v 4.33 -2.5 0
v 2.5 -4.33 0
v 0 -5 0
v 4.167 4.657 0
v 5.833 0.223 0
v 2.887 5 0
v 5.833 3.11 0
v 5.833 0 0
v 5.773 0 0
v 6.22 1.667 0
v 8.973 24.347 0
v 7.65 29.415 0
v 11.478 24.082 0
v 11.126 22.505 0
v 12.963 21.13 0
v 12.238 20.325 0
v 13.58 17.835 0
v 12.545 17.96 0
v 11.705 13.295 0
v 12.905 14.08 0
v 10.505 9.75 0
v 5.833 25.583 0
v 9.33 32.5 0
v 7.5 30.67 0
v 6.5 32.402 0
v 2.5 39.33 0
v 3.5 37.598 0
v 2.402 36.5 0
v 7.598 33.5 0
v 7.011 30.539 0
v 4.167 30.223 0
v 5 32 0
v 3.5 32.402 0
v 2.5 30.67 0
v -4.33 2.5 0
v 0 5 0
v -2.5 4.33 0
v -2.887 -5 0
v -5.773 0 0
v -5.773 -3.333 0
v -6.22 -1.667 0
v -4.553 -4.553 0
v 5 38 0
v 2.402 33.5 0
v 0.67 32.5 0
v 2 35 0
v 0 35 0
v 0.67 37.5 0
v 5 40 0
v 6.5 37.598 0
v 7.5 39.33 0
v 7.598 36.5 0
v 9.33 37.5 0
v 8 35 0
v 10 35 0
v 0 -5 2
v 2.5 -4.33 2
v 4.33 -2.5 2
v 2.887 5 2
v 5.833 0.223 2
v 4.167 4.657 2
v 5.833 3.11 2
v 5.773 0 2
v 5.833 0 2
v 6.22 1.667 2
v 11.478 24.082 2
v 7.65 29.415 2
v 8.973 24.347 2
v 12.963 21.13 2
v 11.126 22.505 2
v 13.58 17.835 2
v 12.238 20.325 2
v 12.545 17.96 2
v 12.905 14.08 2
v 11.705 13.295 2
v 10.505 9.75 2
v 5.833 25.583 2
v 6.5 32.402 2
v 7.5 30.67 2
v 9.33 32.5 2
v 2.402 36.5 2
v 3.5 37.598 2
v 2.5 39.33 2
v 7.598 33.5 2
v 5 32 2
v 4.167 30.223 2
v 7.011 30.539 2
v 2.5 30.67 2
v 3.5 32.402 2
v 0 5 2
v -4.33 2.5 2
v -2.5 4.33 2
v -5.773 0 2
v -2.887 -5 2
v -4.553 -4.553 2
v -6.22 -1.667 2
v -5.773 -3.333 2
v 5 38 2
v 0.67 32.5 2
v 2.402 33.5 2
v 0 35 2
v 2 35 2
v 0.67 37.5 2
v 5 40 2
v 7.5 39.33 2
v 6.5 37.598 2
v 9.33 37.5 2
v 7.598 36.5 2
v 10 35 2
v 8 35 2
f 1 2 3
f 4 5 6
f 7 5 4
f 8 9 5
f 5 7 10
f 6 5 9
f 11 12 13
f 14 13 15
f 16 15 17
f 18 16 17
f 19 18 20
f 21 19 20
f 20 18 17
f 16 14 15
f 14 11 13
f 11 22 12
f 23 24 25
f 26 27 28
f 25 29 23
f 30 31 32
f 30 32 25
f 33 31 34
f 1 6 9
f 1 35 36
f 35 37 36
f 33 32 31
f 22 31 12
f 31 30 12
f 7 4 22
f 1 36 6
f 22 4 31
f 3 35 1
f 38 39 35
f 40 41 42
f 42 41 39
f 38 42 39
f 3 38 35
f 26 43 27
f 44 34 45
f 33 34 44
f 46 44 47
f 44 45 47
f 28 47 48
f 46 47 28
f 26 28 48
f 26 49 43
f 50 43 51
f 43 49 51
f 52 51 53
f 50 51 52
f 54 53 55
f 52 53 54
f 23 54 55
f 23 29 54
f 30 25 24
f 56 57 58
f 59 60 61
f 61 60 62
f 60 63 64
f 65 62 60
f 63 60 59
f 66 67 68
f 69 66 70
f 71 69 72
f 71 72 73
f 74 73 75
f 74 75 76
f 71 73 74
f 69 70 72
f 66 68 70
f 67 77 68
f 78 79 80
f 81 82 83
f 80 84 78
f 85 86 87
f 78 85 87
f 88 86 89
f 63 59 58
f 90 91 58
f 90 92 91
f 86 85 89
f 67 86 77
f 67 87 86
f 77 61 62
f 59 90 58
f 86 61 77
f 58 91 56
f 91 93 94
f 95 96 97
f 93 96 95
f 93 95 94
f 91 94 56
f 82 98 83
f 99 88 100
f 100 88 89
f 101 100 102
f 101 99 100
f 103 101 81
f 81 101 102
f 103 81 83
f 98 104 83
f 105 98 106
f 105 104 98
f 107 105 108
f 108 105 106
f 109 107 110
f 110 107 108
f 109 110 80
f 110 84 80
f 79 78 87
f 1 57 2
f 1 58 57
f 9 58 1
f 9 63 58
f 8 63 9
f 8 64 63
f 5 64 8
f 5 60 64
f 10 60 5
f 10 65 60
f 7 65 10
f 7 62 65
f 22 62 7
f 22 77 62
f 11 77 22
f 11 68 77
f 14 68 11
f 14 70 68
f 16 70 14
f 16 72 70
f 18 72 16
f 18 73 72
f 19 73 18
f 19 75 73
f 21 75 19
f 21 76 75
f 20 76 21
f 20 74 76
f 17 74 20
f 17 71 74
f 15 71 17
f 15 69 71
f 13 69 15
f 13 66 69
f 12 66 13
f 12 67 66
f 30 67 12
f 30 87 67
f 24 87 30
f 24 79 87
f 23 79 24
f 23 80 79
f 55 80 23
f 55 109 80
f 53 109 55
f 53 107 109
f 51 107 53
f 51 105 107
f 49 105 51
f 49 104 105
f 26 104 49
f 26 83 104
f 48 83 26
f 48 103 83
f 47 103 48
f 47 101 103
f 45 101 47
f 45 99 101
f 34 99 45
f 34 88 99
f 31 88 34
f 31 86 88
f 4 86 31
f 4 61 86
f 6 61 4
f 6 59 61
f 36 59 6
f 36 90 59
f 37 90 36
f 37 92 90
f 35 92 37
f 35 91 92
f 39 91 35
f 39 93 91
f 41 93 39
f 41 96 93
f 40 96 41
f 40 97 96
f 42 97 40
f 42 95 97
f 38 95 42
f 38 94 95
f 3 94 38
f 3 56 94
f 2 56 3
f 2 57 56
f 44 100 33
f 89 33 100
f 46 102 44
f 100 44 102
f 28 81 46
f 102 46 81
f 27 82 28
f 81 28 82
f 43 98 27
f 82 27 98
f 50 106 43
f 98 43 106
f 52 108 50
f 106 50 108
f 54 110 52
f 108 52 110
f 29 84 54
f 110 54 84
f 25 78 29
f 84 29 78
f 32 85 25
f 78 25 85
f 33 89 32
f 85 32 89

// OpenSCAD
theitem = "1/8"; // [alt,bass,violin,#,b,natural,1/1,1/2,1/4,1/8,1/16,1/32,1/1 break,1/2 break,1/4 break,1/8 break,1/16 break,1/32 break]

//height of the note-body. a normal note has a height of "3.5 * note_body_height"
note_body_height =10;
zeilenhoehe = note_body_height;

ring_x = 5;
ring_y = 35;
ring_inner_radius = 3;
ring_wallthickness = 2;

z_height = 2; 

$fn=11+1;



 
linear_extrude(height=z_height)
difference(){
	union(){
		item(theitem);
		translate([ring_x,ring_y,0])
			circle(r=ring_inner_radius+ring_wallthickness);
	}
	translate([ring_x,ring_y,0])
		circle(r=ring_inner_radius);
	
}



module item(item){

if(item == "violin"){
	violinschluessel(zeilenhoehe);
}else if(item == "bass"){
	bassschluessel(zeilenhoehe);
}else if(item == "alt"){
	altschluessel(zeilenhoehe);
}else if(item == "#"){
	translate([0,-zeilenhoehe + 5*(zeilenhoehe/2),0])
			vorzeichen("#", zeilenhoehe);
}else if(item == "b"){
	translate([0,-zeilenhoehe + 5*(zeilenhoehe/2),0])
			vorzeichen("b", zeilenhoehe);
}else if(item == "natural"){
	translate([0,-zeilenhoehe + 5*(zeilenhoehe/2),0])
			vorzeichen("n", zeilenhoehe);
}else if(item == "1/1"){	
	note(zeilenhoehe,"1/1",5);
}else if(item == "1/2"){	
	note(zeilenhoehe,"1/2",5);
}else if(item == "1/4"){	
	note(zeilenhoehe,"1/4",5);
}else if(item == "1/8"){	
	note(zeilenhoehe,"1/8",5);
}else if(item == "1/16"){	
	note(zeilenhoehe,"1/6",5);
}else if(item == "1/32"){	
	note(zeilenhoehe,"1/3",5);
}else if(item == "1/32"){	
	note(zeilenhoehe,"1/3",5);
}else if(item == "1/1 break"){	
	break(zeilenhoehe,"1/1");
}else if(item == "1/2 break"){	
	break(zeilenhoehe,"1/2");
}else if(item == "1/4 break"){	
	break(zeilenhoehe,"1/4");
}else if(item == "1/8 break"){	
	break(zeilenhoehe,"1/8");
}else if(item == "1/16 break"){	
	break(zeilenhoehe,"1/6");
}else if(item == "1/32 break"){	
	break(zeilenhoehe,"1/3");
}

}


/////////////////////////////////////





module note(zh,nw,tonhoehe){

	notenradius = zh/2;
	zweidrittel=notenradius*2/3;

	if(nw != "1/1"){

	difference(){
	union(){
			translate([zh/2-zweidrittel/4,0,0])
				square(size = [zweidrittel/2,zh*3.5]);
		rotate([0,0,30])
			hull(){
				circle(r = zh/2);
				translate([zweidrittel,0,0])
					circle(r = zweidrittel);
				translate([-zweidrittel,0,0])
					circle(r = zweidrittel);
			}
	}
		if(nw == "1/2"){
			rotate([0,0,30])
				hull(){
					translate([zh/4,0,0])
						circle(r = zh/4);

					translate([-zh/4,0,0])
						circle(r = zh/4);
				}
		}
	}

	
	if(nw == "1/8"){
		translate([tonhoehe >= 6 ? zh/2.5 : zh/2 + (zweidrittel/4.1),zh*2.85,0])
			if(tonhoehe >= 6)
				mirror(0,1,0)
					fahne(zh);
			else
				fahne(zh);
	}
	if(nw == "1/6"){
		for(i=[0:1])
		translate([tonhoehe >= 6 ? zh/2.5 : zh/2 + (zweidrittel/4.1),zh*2.85 - (i*zh),0])
			if(tonhoehe >= 6)
				mirror(0,1,0)
					fahne(zh);
			else
				fahne(zh);
	}
	if(nw == "1/3"){
		for(i=[-1:1])
		translate([tonhoehe >= 6 ? zh/2.5 : zh/2 + (zweidrittel/4.1),zh*2.85 - (i*zh),0])
			if(tonhoehe >= 6)
				mirror(0,1,0)
					fahne(zh);
			else
				fahne(zh);
		translate([zh/2-zweidrittel/4,zh,0])
				square(size = [zweidrittel/2,zh*3.5]);
	}


	}else{
difference(){
	union(){
			hull(){
				circle(r = zh/2);
				translate([zweidrittel,0,0])
					circle(r = zweidrittel);
				translate([-zweidrittel,0,0])
					circle(r = zweidrittel);
			}
	}

			rotate([0,0,-30])
				hull(){
					translate([zh/8,0,0])
						circle(r = zh/4);

					translate([-zh/8,0,0])
						circle(r = zh/4);
				}
}

	}
}



module fahne(zh){
scale(v = [zh/4, zh/4, zh/4])
translate([1.5,-2.5,0])
  polygon(points=
    [[-1.608, 1.379], [-0.236, 0.839], [0.625, 0.102], [1.070, -0.770], [1.193, -1.716], [0.857, -3.582], [0.377, -5.000], [1.337, -3.268], [1.607, -1.766], [1.360, -0.448], [0.766, 0.733], [-0.765, 2.866], [-1.359, 3.910], [-1.608, 5.000]]
    , paths=
    [[0, 1, 2, 3, 4, 5, 6, 7, 8, 9, 10, 11, 12, 13, 0]]
    );

}


module vorzeichen(vz, zh){
	if(vz == "#")
		vorzeichen_sharp(zh);
	if(vz == "b")
		vorzeichen_b(zh);
	if(vz == "n")
		vorzeichen_natural(zh);
}


module vorzeichen_sharp(zh) {
scale(v = [zh/5, zh/5, zh/5])
  polygon(points=
    [[0.676, 6.500], [0.676, 3.768], [-0.620, 3.194], [-0.620, 5.880], [-1.259, 5.880], [-1.259, 2.907], [-1.935, 2.611], [-1.935, 0.444], [-1.259, 0.741], [-1.259, -1.852], [-1.935, -2.148], [-1.935, -4.315], [-1.259, -4.018], [-1.259, -6.500], [-0.620, -6.500], [-0.620, -3.731], [0.676, -3.167], [0.676, -5.843], [1.315, -5.843], [1.315, -2.880], [1.935, -2.611], [1.935, -0.435], [1.315, -0.713], [1.315, 1.880], [1.935, 2.157], [1.935, 4.324], [1.315, 4.046], [1.315, 6.500], [0.676, 1.602], [0.676, -0.991], [-0.620, -1.565], [-0.620, 1.028]]
    , paths=
    [[0, 1, 2, 3, 4, 5, 6, 7, 8, 9, 10, 11, 12, 13, 14, 15, 16, 17, 18, 19, 20, 21, 22, 23, 24, 25, 26, 27, 0, 0], [28, 29, 30, 31, 28, 28]]
    );
}

module vorzeichen_b(zh) {
scale(v = [zh/5, zh/5, zh/5])
translate([0,3,0])
  polygon(points=
    [[-3.276, 7.500], [-3.276, -7.500], [-3.093, -7.500], [-0.500, -6.648], [1.446, -5.288], [2.710, -3.675], [3.256, -2.064], [3.049, -0.712], [2.054, 0.127], [0.236, 0.197], [-2.440, -0.758], [-2.440, 7.500], [-3.276, 7.500], [-0.009, -0.627], [0.711, -0.811], [1.005, -1.301], [0.585, -2.862], [-0.741, -4.638], [-2.440, -5.958], [-2.440, -1.280]]
    , paths=
    [[0, 1, 2, 3, 4, 5, 6, 7, 8, 9, 10, 11, 12, 0], [13, 14, 15, 16, 17, 18, 19, 13, 13]]
    );
}

module vorzeichen_natural(zh) {
scale(v = [zh/5, zh/5, zh/5])
  polygon(points=
    [[-1.915, 6.500], [-1.915, -3.955], [1.295, -1.911], [1.295, -6.500], [1.915, -6.500], [1.915, 3.955], [-1.268, 1.929], [-1.268, 6.500], [1.295, 1.837], [1.295, -0.190], [-1.268, -1.818], [-1.268, 0.208]]
    , paths=
    [[0, 1, 2, 3, 4, 5, 6, 7, 0], [8, 9, 10, 11, 8]]
    );
}


module break(zh,nw){
	if(nw == "1/1")
		pause_1_1(zh);
	if(nw == "1/2")
		pause_1_2(zh);
	if(nw == "1/4")
		pause_1_4(zh);
	if(nw == "1/8")
		pause_1_8(zh);
	if(nw == "1/6")
		pause_1_16(zh);
	if(nw == "1/3")
		pause_1_32(zh);
}


module pause_1_1(zh) {
translate([0,2.5*zh,0])
	square(size = [zh*2,zh*0.5]);
}

module pause_1_2(zh) {
translate([0,2*zh,0])
	square(size = [zh*2,zh*0.5]);
}

module pause_1_4(zh) {
translate([0,2*zh,0])
scale(v = [zh/5.5, zh/5.5, zh/5.5])
  polygon(points=
    [[-0.983, 7.462], [-1.147, 7.044], [-0.707, 6.498], [-0.039, 5.578], [0.121, 4.196], [-0.584, 2.939], [-1.172, 2.439], [-2.362, 1.138], [-2.407, 0.846], [-1.545, -0.471], [0.527, -2.922], [0.589, -2.983], [0.507, -2.942], [-1.205, -2.433], [-2.382, -2.442], [-2.677, -2.733], [-2.550, -4.386], [-1.402, -6.689], [-0.815, -7.465], [-0.605, -7.465], [-0.666, -7.174], [-1.124, -5.887], [-1.065, -4.554], [-0.605, -3.968], [0.668, -3.969], [1.907, -4.595], [2.075, -4.744], [2.494, -4.575], [2.346, -4.095], [0.778, -2.231], [0.191, -0.849], [0.372, 0.150], [0.946, 0.994], [1.530, 1.494], [2.744, 2.837], [2.600, 3.588], [0.946, 5.578], [-0.707, 7.483], [-0.983, 7.462]]
    , paths=
    [[0, 1, 2, 3, 4, 5, 6, 7, 8, 9, 10, 11, 12, 13, 14, 15, 16, 17, 18, 19, 20, 21, 22, 23, 24, 25, 26, 27, 28, 29, 30, 31, 32, 33, 34, 35, 36, 37, 38, 0]]
    );
}

module pause_1_8(zh) {
translate([0,2*zh,0])
scale(v = [zh/5.5, zh/5.5, zh/5.5])
  polygon(points=
    [[-1.481, 4.970], [-2.212, 4.617], [-2.667, 3.941], [-2.709, 3.489], [-2.537, 2.735], [-2.058, 2.169], [-1.355, 1.832], [-0.302, 1.807], [1.121, 2.152], [1.378, 2.241], [0.108, -1.269], [-1.140, -4.775], [-1.030, -4.843], [-0.536, -4.991], [0.088, -4.712], [1.421, -0.193], [2.711, 4.262], [2.669, 4.324], [2.218, 4.392], [2.066, 4.198], [1.121, 3.080], [0.539, 2.949], [0.150, 3.747], [-0.452, 4.802], [-1.481, 4.970]]
    , paths=
    [[0, 1, 2, 3, 4, 5, 6, 7, 8, 9, 10, 11, 12, 13, 14, 15, 16, 17, 18, 19, 20, 21, 22, 23, 24, 0]]
    );
}

module pause_1_16(zh) {
translate([0,1.5*zh,0])
scale(v = [zh/5.5, zh/5.5, zh/5.5])
  polygon(points=
    [[-0.573, 7.468], [-1.285, 7.123], [-1.724, 6.464], [-1.769, 6.024], [-1.601, 5.288], [-1.134, 4.737], [-0.445, 4.408], [0.557, 4.374], [1.924, 4.700], [2.194, 4.786], [1.212, 1.595], [0.434, 0.506], [-0.235, 0.254], [-0.614, 1.032], [-0.971, 1.846], [-1.808, 2.254], [-2.753, 2.014], [-3.361, 1.216], [-3.406, 0.777], [-3.238, 0.044], [-2.771, -0.507], [-2.082, -0.836], [-0.865, -0.836], [0.266, -0.543], [0.583, -0.461], [-1.515, -7.255], [-1.182, -7.444], [-0.676, -7.444], [-0.343, -7.235], [1.545, -0.206], [3.413, 6.777], [3.371, 6.838], [2.972, 6.924], [2.639, 6.505], [1.965, 5.646], [1.401, 5.498], [1.023, 6.275], [0.434, 7.303], [-0.573, 7.468]]
    , paths=
    [[0, 1, 2, 3, 4, 5, 6, 7, 8, 9, 10, 11, 12, 13, 14, 15, 16, 17, 18, 19, 20, 21, 22, 23, 24, 25, 26, 27, 28, 29, 30, 31, 32, 33, 34, 35, 36, 37, 38, 0]]
    );
}

module pause_1_32(zh) {
translate([0,2*zh,0])
scale(v = [zh/5.5, zh/5.5, zh/5.5])
  polygon(points=
    [[0.122, 9.959], [-0.580, 9.615], [-1.016, 8.963], [-1.061, 8.528], [-1.016, 8.093], [-0.689, 7.491], [-0.126, 7.078], [0.764, 6.891], [2.488, 7.200], [2.817, 7.306], [2.402, 5.708], [1.926, 3.969], [1.179, 2.973], [0.642, 2.826], [0.269, 3.594], [-0.085, 4.404], [-0.912, 4.803], [-1.846, 4.566], [-2.447, 3.782], [-2.492, 3.347], [-2.324, 2.619], [-1.863, 2.074], [-1.183, 1.749], [0.020, 1.749], [1.138, 2.038], [1.471, 2.144], [0.597, -1.092], [-0.147, -2.129], [-0.789, -2.357], [-1.162, -1.588], [-1.516, -0.783], [-2.343, -0.380], [-3.276, -0.617], [-3.878, -1.405], [-3.923, -1.839], [-3.878, -2.274], [-3.550, -2.876], [-2.987, -3.291], [-2.077, -3.478], [-1.370, -3.433], [-0.166, -3.124], [0.102, -3.018], [0.102, -3.084], [-1.682, -9.758], [-1.102, -10.005], [-0.520, -9.758], [1.740, -0.222], [3.919, 9.317], [3.625, 9.439], [3.272, 9.110], [2.467, 8.029], [2.073, 8.008], [1.699, 8.777], [1.118, 9.793], [0.122, 9.959]]
    , paths=
    [[0, 1, 2, 3, 4, 5, 6, 7, 8, 9, 10, 11, 12, 13, 14, 15, 16, 17, 18, 19, 20, 21, 22, 23, 24, 25, 26, 27, 28, 29, 30, 31, 32, 33, 34, 35, 36, 37, 38, 39, 40, 41, 42, 43, 44, 45, 46, 47, 48, 49, 50, 51, 52, 53, 54, 0]]
    );
}


module altschluessel(zh) {
scale(v = [zh/6.2, zh/6.2, zh/6.2])
translate([0,12.5,0])
  polygon(points=
    [[-8.123, -12.484], [-8.123, 11.892], [-8.123, 12.431], [-5.302, 12.431], [-5.302, -11.945], [-5.302, -12.484], [-3.880, -12.484], [-3.880, 11.892], [-3.880, 12.431], [-2.979, 12.431], [-2.979, 0.222], [-1.632, 1.681], [-0.497, 4.038], [-0.019, 5.888], [0.638, 3.753], [1.657, 2.611], [2.792, 2.273], [3.946, 2.591], [4.584, 3.552], [4.966, 6.692], [4.924, 8.203], [4.711, 9.556], [4.171, 10.782], [3.142, 11.522], [2.007, 11.681], [1.158, 11.501], [0.776, 10.994], [1.179, 10.317], [1.635, 9.736], [1.763, 9.186], [1.317, 8.097], [0.129, 7.643], [-1.059, 8.171], [-1.536, 9.429], [-1.331, 10.332], [-0.847, 11.100], [0.723, 12.135], [2.611, 12.484], [4.680, 12.104], [6.451, 10.983], [7.681, 9.165], [8.127, 6.744], [7.953, 5.033], [7.438, 3.647], [6.642, 2.572], [5.656, 1.829], [3.333, 1.216], [1.211, 1.787], [0.087, -0.031], [1.211, -1.839], [3.492, -1.363], [4.815, -1.567], [5.963, -2.167], [6.893, -3.089], [7.575, -4.249], [8.127, -6.892], [7.960, -8.333], [7.459, -9.672], [6.655, -10.824], [5.581, -11.723], [4.274, -12.293], [2.792, -12.484], [1.113, -12.229], [-0.263, -11.617], [-1.179, -10.644], [-1.483, -9.291], [-0.942, -8.129], [0.087, -7.653], [1.285, -8.129], [1.816, -9.291], [1.688, -9.799], [1.317, -10.338], [0.967, -10.782], [0.829, -11.152], [1.190, -11.628], [2.102, -11.860], [3.559, -11.450], [4.436, -10.391], [4.865, -8.816], [5.008, -6.892], [4.595, -3.699], [3.940, -2.668], [2.792, -2.325], [1.694, -2.590], [0.882, -3.393], [0.023, -5.898], [-0.635, -3.551], [-1.706, -1.554], [-2.979, -0.222], [-2.979, -12.484], [-3.880, -12.484]]
    , paths=
    [[0, 1, 2, 3, 4, 5, 0, 0], [6, 7, 8, 9, 10, 11, 12, 13, 14, 15, 16, 17, 18, 19, 20, 21, 22, 23, 24, 25, 26, 27, 28, 29, 30, 31, 32, 33, 34, 35, 36, 37, 38, 39, 40, 41, 42, 43, 44, 45, 46, 47, 48, 49, 50, 51, 52, 53, 54, 55, 56, 57, 58, 59, 60, 61, 62, 63, 64, 65, 66, 67, 68, 69, 70, 71, 72, 73, 74, 75, 76, 77, 78, 79, 80, 81, 82, 83, 84, 85, 86, 87, 88, 89, 90, 6]]
    );}





module bassschluessel(zh) {
translate([0,zh*1.3,0])
scale(v = [zh/6.2, zh/6.2, zh/6.2])
translate([0,7.5,0])
  polygon(points=
    [[-6.497, -7.077], [-3.725, -5.161], [-1.850, -3.543], [-0.220, -1.360], [0.670, 0.713], [1.064, 2.959], [0.796, 4.860], [-0.102, 6.360], [-0.835, 6.802], [-1.763, 6.949], [-3.630, 6.556], [-4.367, 6.036], [-4.843, 5.268], [-4.922, 5.040], [-4.725, 4.750], [-4.410, 4.648], [-4.024, 4.718], [-3.496, 4.797], [-2.370, 4.357], [-1.874, 3.297], [-2.126, 2.457], [-2.811, 1.836], [-3.772, 1.609], [-4.646, 1.751], [-5.379, 2.182], [-5.868, 2.850], [-6.032, 3.690], [-5.850, 4.798], [-5.308, 5.747], [-3.449, 7.051], [-1.173, 7.491], [0.060, 7.331], [1.222, 6.847], [2.234, 6.090], [3.010, 5.103], [3.510, 3.959], [3.679, 2.732], [3.301, 0.551], [2.167, -1.470], [0.476, -3.285], [-1.574, -4.847], [-6.387, -7.486], [4.443, 5.072], [4.750, 5.779], [5.483, 6.069], [6.184, 5.747], [6.499, 5.033], [6.184, 4.310], [5.443, 4.027], [4.727, 4.334], [4.443, 0.957], [4.735, 1.671], [5.483, 1.962], [6.184, 1.648], [6.499, 0.957], [6.200, 0.211], [5.483, -0.088], [4.735, 0.203]]
    , paths=
    [[0, 1, 2, 3, 4, 5, 6, 7, 8, 9, 10, 11, 12, 13, 14, 15, 16, 17, 18, 19, 20, 21, 22, 23, 24, 25, 26, 27, 28, 29, 30, 31, 32, 33, 34, 35, 36, 37, 38, 39, 40, 41, 0, 0], [42, 43, 44, 45, 46, 47, 48, 49, 42, 42], [50, 51, 52, 53, 54, 55, 56, 57, 50, 50]]
    );}



module violinschluessel(zh) {
scale(v = [zh/5.2, zh/5.2, zh/5.2])
translate([0,9.5,0])
  polygon(points=
    [[0.832, -1.806], [-0.578, -2.778], [-1.061, -3.577], [-1.220, -4.447], [-0.848, -5.711], [0.249, -6.726], [0.485, -6.967], [0.283, -7.088], [-0.767, -6.625], [-1.608, -5.840], [-2.165, -4.819], [-2.368, -3.656], [-2.153, -2.373], [-1.583, -1.187], [-0.715, -0.206], [0.367, 0.439], [-0.215, 3.492], [-1.983, 1.806], [-3.390, 0.043], [-4.321, -1.828], [-4.664, -3.854], [-4.284, -5.677], [-3.221, -7.294], [-1.577, -8.405], [0.485, -8.825], [2.140, -8.541], [1.439, -1.720], [2.756, -8.335], [3.610, -7.818], [4.219, -7.066], [4.706, -4.869], [4.175, -3.269], [3.052, -2.133], [-0.291, 7.225], [0.654, 8.120], [1.659, 9.574], [2.444, 11.277], [2.731, 12.885], [2.672, 13.505], [2.385, 14.218], [1.769, 14.459], [1.047, 14.221], [0.401, 13.505], [-0.359, 11.561], [-0.680, 9.324], [-0.823, 6.726], [-1.456, 10.984], [-1.178, 13.591], [-0.443, 15.698], [0.637, 17.066], [1.406, 17.487], [1.693, 17.367], [2.022, 16.988], [3.154, 14.583], [3.533, 11.733], [3.153, 8.868], [2.064, 6.202], [0.333, 4.000], [1.017, 0.611], [1.786, 0.688], [3.533, 0.275], [4.892, -0.843], [5.753, -2.443], [6.057, -4.327], [5.861, -5.784], [5.272, -7.105], [4.290, -8.190], [2.908, -8.946], [3.271, -10.761], [3.651, -12.644], [3.769, -13.995], [3.288, -15.810], [1.963, -17.048], [0.148, -17.487], [-1.157, -17.288], [-2.284, -16.696], [-3.079, -15.758], [-3.381, -14.537], [-3.094, -13.393], [-2.402, -12.515], [-1.372, -12.137], [-0.435, -12.412], [0.266, -13.169], [0.528, -14.218], [0.021, -15.509], [-1.262, -16.042], [-1.456, -16.042], [-0.804, -16.627], [0.165, -16.825], [1.321, -16.584], [2.326, -15.930], [2.866, -15.053], [3.077, -13.599], [2.959, -12.361], [2.604, -10.743], [2.258, -9.212], [0.680, -9.410], [-0.663, -9.267], [-1.929, -8.834], [-4.090, -7.225], [-5.534, -4.886], [-6.057, -2.159], [-5.559, 0.353], [-4.386, 2.615], [-2.891, 4.542]]
    , paths=
    [[0, 1, 2, 3, 4, 5, 6, 7, 8, 9, 10, 11, 12, 13, 14, 15, 16, 17, 18, 19, 20, 21, 22, 23, 24, 25, 0, 0], [26, 27, 28, 29, 30, 31, 32, 26, 26], [33, 34, 35, 36, 37, 38, 39, 40, 41, 42, 43, 44, 33, 33], [45, 46, 47, 48, 49, 50, 51, 52, 53, 54, 55, 56, 57, 58, 59, 60, 61, 62, 63, 64, 65, 66, 67, 68, 69, 70, 71, 72, 73, 74, 75, 76, 77, 78, 79, 80, 81, 82, 83, 84, 85, 86, 87, 88, 89, 90, 91, 92, 93, 94, 95, 96, 97, 98, 99, 100, 101, 102, 103, 104, 45, 45]]
    );}

